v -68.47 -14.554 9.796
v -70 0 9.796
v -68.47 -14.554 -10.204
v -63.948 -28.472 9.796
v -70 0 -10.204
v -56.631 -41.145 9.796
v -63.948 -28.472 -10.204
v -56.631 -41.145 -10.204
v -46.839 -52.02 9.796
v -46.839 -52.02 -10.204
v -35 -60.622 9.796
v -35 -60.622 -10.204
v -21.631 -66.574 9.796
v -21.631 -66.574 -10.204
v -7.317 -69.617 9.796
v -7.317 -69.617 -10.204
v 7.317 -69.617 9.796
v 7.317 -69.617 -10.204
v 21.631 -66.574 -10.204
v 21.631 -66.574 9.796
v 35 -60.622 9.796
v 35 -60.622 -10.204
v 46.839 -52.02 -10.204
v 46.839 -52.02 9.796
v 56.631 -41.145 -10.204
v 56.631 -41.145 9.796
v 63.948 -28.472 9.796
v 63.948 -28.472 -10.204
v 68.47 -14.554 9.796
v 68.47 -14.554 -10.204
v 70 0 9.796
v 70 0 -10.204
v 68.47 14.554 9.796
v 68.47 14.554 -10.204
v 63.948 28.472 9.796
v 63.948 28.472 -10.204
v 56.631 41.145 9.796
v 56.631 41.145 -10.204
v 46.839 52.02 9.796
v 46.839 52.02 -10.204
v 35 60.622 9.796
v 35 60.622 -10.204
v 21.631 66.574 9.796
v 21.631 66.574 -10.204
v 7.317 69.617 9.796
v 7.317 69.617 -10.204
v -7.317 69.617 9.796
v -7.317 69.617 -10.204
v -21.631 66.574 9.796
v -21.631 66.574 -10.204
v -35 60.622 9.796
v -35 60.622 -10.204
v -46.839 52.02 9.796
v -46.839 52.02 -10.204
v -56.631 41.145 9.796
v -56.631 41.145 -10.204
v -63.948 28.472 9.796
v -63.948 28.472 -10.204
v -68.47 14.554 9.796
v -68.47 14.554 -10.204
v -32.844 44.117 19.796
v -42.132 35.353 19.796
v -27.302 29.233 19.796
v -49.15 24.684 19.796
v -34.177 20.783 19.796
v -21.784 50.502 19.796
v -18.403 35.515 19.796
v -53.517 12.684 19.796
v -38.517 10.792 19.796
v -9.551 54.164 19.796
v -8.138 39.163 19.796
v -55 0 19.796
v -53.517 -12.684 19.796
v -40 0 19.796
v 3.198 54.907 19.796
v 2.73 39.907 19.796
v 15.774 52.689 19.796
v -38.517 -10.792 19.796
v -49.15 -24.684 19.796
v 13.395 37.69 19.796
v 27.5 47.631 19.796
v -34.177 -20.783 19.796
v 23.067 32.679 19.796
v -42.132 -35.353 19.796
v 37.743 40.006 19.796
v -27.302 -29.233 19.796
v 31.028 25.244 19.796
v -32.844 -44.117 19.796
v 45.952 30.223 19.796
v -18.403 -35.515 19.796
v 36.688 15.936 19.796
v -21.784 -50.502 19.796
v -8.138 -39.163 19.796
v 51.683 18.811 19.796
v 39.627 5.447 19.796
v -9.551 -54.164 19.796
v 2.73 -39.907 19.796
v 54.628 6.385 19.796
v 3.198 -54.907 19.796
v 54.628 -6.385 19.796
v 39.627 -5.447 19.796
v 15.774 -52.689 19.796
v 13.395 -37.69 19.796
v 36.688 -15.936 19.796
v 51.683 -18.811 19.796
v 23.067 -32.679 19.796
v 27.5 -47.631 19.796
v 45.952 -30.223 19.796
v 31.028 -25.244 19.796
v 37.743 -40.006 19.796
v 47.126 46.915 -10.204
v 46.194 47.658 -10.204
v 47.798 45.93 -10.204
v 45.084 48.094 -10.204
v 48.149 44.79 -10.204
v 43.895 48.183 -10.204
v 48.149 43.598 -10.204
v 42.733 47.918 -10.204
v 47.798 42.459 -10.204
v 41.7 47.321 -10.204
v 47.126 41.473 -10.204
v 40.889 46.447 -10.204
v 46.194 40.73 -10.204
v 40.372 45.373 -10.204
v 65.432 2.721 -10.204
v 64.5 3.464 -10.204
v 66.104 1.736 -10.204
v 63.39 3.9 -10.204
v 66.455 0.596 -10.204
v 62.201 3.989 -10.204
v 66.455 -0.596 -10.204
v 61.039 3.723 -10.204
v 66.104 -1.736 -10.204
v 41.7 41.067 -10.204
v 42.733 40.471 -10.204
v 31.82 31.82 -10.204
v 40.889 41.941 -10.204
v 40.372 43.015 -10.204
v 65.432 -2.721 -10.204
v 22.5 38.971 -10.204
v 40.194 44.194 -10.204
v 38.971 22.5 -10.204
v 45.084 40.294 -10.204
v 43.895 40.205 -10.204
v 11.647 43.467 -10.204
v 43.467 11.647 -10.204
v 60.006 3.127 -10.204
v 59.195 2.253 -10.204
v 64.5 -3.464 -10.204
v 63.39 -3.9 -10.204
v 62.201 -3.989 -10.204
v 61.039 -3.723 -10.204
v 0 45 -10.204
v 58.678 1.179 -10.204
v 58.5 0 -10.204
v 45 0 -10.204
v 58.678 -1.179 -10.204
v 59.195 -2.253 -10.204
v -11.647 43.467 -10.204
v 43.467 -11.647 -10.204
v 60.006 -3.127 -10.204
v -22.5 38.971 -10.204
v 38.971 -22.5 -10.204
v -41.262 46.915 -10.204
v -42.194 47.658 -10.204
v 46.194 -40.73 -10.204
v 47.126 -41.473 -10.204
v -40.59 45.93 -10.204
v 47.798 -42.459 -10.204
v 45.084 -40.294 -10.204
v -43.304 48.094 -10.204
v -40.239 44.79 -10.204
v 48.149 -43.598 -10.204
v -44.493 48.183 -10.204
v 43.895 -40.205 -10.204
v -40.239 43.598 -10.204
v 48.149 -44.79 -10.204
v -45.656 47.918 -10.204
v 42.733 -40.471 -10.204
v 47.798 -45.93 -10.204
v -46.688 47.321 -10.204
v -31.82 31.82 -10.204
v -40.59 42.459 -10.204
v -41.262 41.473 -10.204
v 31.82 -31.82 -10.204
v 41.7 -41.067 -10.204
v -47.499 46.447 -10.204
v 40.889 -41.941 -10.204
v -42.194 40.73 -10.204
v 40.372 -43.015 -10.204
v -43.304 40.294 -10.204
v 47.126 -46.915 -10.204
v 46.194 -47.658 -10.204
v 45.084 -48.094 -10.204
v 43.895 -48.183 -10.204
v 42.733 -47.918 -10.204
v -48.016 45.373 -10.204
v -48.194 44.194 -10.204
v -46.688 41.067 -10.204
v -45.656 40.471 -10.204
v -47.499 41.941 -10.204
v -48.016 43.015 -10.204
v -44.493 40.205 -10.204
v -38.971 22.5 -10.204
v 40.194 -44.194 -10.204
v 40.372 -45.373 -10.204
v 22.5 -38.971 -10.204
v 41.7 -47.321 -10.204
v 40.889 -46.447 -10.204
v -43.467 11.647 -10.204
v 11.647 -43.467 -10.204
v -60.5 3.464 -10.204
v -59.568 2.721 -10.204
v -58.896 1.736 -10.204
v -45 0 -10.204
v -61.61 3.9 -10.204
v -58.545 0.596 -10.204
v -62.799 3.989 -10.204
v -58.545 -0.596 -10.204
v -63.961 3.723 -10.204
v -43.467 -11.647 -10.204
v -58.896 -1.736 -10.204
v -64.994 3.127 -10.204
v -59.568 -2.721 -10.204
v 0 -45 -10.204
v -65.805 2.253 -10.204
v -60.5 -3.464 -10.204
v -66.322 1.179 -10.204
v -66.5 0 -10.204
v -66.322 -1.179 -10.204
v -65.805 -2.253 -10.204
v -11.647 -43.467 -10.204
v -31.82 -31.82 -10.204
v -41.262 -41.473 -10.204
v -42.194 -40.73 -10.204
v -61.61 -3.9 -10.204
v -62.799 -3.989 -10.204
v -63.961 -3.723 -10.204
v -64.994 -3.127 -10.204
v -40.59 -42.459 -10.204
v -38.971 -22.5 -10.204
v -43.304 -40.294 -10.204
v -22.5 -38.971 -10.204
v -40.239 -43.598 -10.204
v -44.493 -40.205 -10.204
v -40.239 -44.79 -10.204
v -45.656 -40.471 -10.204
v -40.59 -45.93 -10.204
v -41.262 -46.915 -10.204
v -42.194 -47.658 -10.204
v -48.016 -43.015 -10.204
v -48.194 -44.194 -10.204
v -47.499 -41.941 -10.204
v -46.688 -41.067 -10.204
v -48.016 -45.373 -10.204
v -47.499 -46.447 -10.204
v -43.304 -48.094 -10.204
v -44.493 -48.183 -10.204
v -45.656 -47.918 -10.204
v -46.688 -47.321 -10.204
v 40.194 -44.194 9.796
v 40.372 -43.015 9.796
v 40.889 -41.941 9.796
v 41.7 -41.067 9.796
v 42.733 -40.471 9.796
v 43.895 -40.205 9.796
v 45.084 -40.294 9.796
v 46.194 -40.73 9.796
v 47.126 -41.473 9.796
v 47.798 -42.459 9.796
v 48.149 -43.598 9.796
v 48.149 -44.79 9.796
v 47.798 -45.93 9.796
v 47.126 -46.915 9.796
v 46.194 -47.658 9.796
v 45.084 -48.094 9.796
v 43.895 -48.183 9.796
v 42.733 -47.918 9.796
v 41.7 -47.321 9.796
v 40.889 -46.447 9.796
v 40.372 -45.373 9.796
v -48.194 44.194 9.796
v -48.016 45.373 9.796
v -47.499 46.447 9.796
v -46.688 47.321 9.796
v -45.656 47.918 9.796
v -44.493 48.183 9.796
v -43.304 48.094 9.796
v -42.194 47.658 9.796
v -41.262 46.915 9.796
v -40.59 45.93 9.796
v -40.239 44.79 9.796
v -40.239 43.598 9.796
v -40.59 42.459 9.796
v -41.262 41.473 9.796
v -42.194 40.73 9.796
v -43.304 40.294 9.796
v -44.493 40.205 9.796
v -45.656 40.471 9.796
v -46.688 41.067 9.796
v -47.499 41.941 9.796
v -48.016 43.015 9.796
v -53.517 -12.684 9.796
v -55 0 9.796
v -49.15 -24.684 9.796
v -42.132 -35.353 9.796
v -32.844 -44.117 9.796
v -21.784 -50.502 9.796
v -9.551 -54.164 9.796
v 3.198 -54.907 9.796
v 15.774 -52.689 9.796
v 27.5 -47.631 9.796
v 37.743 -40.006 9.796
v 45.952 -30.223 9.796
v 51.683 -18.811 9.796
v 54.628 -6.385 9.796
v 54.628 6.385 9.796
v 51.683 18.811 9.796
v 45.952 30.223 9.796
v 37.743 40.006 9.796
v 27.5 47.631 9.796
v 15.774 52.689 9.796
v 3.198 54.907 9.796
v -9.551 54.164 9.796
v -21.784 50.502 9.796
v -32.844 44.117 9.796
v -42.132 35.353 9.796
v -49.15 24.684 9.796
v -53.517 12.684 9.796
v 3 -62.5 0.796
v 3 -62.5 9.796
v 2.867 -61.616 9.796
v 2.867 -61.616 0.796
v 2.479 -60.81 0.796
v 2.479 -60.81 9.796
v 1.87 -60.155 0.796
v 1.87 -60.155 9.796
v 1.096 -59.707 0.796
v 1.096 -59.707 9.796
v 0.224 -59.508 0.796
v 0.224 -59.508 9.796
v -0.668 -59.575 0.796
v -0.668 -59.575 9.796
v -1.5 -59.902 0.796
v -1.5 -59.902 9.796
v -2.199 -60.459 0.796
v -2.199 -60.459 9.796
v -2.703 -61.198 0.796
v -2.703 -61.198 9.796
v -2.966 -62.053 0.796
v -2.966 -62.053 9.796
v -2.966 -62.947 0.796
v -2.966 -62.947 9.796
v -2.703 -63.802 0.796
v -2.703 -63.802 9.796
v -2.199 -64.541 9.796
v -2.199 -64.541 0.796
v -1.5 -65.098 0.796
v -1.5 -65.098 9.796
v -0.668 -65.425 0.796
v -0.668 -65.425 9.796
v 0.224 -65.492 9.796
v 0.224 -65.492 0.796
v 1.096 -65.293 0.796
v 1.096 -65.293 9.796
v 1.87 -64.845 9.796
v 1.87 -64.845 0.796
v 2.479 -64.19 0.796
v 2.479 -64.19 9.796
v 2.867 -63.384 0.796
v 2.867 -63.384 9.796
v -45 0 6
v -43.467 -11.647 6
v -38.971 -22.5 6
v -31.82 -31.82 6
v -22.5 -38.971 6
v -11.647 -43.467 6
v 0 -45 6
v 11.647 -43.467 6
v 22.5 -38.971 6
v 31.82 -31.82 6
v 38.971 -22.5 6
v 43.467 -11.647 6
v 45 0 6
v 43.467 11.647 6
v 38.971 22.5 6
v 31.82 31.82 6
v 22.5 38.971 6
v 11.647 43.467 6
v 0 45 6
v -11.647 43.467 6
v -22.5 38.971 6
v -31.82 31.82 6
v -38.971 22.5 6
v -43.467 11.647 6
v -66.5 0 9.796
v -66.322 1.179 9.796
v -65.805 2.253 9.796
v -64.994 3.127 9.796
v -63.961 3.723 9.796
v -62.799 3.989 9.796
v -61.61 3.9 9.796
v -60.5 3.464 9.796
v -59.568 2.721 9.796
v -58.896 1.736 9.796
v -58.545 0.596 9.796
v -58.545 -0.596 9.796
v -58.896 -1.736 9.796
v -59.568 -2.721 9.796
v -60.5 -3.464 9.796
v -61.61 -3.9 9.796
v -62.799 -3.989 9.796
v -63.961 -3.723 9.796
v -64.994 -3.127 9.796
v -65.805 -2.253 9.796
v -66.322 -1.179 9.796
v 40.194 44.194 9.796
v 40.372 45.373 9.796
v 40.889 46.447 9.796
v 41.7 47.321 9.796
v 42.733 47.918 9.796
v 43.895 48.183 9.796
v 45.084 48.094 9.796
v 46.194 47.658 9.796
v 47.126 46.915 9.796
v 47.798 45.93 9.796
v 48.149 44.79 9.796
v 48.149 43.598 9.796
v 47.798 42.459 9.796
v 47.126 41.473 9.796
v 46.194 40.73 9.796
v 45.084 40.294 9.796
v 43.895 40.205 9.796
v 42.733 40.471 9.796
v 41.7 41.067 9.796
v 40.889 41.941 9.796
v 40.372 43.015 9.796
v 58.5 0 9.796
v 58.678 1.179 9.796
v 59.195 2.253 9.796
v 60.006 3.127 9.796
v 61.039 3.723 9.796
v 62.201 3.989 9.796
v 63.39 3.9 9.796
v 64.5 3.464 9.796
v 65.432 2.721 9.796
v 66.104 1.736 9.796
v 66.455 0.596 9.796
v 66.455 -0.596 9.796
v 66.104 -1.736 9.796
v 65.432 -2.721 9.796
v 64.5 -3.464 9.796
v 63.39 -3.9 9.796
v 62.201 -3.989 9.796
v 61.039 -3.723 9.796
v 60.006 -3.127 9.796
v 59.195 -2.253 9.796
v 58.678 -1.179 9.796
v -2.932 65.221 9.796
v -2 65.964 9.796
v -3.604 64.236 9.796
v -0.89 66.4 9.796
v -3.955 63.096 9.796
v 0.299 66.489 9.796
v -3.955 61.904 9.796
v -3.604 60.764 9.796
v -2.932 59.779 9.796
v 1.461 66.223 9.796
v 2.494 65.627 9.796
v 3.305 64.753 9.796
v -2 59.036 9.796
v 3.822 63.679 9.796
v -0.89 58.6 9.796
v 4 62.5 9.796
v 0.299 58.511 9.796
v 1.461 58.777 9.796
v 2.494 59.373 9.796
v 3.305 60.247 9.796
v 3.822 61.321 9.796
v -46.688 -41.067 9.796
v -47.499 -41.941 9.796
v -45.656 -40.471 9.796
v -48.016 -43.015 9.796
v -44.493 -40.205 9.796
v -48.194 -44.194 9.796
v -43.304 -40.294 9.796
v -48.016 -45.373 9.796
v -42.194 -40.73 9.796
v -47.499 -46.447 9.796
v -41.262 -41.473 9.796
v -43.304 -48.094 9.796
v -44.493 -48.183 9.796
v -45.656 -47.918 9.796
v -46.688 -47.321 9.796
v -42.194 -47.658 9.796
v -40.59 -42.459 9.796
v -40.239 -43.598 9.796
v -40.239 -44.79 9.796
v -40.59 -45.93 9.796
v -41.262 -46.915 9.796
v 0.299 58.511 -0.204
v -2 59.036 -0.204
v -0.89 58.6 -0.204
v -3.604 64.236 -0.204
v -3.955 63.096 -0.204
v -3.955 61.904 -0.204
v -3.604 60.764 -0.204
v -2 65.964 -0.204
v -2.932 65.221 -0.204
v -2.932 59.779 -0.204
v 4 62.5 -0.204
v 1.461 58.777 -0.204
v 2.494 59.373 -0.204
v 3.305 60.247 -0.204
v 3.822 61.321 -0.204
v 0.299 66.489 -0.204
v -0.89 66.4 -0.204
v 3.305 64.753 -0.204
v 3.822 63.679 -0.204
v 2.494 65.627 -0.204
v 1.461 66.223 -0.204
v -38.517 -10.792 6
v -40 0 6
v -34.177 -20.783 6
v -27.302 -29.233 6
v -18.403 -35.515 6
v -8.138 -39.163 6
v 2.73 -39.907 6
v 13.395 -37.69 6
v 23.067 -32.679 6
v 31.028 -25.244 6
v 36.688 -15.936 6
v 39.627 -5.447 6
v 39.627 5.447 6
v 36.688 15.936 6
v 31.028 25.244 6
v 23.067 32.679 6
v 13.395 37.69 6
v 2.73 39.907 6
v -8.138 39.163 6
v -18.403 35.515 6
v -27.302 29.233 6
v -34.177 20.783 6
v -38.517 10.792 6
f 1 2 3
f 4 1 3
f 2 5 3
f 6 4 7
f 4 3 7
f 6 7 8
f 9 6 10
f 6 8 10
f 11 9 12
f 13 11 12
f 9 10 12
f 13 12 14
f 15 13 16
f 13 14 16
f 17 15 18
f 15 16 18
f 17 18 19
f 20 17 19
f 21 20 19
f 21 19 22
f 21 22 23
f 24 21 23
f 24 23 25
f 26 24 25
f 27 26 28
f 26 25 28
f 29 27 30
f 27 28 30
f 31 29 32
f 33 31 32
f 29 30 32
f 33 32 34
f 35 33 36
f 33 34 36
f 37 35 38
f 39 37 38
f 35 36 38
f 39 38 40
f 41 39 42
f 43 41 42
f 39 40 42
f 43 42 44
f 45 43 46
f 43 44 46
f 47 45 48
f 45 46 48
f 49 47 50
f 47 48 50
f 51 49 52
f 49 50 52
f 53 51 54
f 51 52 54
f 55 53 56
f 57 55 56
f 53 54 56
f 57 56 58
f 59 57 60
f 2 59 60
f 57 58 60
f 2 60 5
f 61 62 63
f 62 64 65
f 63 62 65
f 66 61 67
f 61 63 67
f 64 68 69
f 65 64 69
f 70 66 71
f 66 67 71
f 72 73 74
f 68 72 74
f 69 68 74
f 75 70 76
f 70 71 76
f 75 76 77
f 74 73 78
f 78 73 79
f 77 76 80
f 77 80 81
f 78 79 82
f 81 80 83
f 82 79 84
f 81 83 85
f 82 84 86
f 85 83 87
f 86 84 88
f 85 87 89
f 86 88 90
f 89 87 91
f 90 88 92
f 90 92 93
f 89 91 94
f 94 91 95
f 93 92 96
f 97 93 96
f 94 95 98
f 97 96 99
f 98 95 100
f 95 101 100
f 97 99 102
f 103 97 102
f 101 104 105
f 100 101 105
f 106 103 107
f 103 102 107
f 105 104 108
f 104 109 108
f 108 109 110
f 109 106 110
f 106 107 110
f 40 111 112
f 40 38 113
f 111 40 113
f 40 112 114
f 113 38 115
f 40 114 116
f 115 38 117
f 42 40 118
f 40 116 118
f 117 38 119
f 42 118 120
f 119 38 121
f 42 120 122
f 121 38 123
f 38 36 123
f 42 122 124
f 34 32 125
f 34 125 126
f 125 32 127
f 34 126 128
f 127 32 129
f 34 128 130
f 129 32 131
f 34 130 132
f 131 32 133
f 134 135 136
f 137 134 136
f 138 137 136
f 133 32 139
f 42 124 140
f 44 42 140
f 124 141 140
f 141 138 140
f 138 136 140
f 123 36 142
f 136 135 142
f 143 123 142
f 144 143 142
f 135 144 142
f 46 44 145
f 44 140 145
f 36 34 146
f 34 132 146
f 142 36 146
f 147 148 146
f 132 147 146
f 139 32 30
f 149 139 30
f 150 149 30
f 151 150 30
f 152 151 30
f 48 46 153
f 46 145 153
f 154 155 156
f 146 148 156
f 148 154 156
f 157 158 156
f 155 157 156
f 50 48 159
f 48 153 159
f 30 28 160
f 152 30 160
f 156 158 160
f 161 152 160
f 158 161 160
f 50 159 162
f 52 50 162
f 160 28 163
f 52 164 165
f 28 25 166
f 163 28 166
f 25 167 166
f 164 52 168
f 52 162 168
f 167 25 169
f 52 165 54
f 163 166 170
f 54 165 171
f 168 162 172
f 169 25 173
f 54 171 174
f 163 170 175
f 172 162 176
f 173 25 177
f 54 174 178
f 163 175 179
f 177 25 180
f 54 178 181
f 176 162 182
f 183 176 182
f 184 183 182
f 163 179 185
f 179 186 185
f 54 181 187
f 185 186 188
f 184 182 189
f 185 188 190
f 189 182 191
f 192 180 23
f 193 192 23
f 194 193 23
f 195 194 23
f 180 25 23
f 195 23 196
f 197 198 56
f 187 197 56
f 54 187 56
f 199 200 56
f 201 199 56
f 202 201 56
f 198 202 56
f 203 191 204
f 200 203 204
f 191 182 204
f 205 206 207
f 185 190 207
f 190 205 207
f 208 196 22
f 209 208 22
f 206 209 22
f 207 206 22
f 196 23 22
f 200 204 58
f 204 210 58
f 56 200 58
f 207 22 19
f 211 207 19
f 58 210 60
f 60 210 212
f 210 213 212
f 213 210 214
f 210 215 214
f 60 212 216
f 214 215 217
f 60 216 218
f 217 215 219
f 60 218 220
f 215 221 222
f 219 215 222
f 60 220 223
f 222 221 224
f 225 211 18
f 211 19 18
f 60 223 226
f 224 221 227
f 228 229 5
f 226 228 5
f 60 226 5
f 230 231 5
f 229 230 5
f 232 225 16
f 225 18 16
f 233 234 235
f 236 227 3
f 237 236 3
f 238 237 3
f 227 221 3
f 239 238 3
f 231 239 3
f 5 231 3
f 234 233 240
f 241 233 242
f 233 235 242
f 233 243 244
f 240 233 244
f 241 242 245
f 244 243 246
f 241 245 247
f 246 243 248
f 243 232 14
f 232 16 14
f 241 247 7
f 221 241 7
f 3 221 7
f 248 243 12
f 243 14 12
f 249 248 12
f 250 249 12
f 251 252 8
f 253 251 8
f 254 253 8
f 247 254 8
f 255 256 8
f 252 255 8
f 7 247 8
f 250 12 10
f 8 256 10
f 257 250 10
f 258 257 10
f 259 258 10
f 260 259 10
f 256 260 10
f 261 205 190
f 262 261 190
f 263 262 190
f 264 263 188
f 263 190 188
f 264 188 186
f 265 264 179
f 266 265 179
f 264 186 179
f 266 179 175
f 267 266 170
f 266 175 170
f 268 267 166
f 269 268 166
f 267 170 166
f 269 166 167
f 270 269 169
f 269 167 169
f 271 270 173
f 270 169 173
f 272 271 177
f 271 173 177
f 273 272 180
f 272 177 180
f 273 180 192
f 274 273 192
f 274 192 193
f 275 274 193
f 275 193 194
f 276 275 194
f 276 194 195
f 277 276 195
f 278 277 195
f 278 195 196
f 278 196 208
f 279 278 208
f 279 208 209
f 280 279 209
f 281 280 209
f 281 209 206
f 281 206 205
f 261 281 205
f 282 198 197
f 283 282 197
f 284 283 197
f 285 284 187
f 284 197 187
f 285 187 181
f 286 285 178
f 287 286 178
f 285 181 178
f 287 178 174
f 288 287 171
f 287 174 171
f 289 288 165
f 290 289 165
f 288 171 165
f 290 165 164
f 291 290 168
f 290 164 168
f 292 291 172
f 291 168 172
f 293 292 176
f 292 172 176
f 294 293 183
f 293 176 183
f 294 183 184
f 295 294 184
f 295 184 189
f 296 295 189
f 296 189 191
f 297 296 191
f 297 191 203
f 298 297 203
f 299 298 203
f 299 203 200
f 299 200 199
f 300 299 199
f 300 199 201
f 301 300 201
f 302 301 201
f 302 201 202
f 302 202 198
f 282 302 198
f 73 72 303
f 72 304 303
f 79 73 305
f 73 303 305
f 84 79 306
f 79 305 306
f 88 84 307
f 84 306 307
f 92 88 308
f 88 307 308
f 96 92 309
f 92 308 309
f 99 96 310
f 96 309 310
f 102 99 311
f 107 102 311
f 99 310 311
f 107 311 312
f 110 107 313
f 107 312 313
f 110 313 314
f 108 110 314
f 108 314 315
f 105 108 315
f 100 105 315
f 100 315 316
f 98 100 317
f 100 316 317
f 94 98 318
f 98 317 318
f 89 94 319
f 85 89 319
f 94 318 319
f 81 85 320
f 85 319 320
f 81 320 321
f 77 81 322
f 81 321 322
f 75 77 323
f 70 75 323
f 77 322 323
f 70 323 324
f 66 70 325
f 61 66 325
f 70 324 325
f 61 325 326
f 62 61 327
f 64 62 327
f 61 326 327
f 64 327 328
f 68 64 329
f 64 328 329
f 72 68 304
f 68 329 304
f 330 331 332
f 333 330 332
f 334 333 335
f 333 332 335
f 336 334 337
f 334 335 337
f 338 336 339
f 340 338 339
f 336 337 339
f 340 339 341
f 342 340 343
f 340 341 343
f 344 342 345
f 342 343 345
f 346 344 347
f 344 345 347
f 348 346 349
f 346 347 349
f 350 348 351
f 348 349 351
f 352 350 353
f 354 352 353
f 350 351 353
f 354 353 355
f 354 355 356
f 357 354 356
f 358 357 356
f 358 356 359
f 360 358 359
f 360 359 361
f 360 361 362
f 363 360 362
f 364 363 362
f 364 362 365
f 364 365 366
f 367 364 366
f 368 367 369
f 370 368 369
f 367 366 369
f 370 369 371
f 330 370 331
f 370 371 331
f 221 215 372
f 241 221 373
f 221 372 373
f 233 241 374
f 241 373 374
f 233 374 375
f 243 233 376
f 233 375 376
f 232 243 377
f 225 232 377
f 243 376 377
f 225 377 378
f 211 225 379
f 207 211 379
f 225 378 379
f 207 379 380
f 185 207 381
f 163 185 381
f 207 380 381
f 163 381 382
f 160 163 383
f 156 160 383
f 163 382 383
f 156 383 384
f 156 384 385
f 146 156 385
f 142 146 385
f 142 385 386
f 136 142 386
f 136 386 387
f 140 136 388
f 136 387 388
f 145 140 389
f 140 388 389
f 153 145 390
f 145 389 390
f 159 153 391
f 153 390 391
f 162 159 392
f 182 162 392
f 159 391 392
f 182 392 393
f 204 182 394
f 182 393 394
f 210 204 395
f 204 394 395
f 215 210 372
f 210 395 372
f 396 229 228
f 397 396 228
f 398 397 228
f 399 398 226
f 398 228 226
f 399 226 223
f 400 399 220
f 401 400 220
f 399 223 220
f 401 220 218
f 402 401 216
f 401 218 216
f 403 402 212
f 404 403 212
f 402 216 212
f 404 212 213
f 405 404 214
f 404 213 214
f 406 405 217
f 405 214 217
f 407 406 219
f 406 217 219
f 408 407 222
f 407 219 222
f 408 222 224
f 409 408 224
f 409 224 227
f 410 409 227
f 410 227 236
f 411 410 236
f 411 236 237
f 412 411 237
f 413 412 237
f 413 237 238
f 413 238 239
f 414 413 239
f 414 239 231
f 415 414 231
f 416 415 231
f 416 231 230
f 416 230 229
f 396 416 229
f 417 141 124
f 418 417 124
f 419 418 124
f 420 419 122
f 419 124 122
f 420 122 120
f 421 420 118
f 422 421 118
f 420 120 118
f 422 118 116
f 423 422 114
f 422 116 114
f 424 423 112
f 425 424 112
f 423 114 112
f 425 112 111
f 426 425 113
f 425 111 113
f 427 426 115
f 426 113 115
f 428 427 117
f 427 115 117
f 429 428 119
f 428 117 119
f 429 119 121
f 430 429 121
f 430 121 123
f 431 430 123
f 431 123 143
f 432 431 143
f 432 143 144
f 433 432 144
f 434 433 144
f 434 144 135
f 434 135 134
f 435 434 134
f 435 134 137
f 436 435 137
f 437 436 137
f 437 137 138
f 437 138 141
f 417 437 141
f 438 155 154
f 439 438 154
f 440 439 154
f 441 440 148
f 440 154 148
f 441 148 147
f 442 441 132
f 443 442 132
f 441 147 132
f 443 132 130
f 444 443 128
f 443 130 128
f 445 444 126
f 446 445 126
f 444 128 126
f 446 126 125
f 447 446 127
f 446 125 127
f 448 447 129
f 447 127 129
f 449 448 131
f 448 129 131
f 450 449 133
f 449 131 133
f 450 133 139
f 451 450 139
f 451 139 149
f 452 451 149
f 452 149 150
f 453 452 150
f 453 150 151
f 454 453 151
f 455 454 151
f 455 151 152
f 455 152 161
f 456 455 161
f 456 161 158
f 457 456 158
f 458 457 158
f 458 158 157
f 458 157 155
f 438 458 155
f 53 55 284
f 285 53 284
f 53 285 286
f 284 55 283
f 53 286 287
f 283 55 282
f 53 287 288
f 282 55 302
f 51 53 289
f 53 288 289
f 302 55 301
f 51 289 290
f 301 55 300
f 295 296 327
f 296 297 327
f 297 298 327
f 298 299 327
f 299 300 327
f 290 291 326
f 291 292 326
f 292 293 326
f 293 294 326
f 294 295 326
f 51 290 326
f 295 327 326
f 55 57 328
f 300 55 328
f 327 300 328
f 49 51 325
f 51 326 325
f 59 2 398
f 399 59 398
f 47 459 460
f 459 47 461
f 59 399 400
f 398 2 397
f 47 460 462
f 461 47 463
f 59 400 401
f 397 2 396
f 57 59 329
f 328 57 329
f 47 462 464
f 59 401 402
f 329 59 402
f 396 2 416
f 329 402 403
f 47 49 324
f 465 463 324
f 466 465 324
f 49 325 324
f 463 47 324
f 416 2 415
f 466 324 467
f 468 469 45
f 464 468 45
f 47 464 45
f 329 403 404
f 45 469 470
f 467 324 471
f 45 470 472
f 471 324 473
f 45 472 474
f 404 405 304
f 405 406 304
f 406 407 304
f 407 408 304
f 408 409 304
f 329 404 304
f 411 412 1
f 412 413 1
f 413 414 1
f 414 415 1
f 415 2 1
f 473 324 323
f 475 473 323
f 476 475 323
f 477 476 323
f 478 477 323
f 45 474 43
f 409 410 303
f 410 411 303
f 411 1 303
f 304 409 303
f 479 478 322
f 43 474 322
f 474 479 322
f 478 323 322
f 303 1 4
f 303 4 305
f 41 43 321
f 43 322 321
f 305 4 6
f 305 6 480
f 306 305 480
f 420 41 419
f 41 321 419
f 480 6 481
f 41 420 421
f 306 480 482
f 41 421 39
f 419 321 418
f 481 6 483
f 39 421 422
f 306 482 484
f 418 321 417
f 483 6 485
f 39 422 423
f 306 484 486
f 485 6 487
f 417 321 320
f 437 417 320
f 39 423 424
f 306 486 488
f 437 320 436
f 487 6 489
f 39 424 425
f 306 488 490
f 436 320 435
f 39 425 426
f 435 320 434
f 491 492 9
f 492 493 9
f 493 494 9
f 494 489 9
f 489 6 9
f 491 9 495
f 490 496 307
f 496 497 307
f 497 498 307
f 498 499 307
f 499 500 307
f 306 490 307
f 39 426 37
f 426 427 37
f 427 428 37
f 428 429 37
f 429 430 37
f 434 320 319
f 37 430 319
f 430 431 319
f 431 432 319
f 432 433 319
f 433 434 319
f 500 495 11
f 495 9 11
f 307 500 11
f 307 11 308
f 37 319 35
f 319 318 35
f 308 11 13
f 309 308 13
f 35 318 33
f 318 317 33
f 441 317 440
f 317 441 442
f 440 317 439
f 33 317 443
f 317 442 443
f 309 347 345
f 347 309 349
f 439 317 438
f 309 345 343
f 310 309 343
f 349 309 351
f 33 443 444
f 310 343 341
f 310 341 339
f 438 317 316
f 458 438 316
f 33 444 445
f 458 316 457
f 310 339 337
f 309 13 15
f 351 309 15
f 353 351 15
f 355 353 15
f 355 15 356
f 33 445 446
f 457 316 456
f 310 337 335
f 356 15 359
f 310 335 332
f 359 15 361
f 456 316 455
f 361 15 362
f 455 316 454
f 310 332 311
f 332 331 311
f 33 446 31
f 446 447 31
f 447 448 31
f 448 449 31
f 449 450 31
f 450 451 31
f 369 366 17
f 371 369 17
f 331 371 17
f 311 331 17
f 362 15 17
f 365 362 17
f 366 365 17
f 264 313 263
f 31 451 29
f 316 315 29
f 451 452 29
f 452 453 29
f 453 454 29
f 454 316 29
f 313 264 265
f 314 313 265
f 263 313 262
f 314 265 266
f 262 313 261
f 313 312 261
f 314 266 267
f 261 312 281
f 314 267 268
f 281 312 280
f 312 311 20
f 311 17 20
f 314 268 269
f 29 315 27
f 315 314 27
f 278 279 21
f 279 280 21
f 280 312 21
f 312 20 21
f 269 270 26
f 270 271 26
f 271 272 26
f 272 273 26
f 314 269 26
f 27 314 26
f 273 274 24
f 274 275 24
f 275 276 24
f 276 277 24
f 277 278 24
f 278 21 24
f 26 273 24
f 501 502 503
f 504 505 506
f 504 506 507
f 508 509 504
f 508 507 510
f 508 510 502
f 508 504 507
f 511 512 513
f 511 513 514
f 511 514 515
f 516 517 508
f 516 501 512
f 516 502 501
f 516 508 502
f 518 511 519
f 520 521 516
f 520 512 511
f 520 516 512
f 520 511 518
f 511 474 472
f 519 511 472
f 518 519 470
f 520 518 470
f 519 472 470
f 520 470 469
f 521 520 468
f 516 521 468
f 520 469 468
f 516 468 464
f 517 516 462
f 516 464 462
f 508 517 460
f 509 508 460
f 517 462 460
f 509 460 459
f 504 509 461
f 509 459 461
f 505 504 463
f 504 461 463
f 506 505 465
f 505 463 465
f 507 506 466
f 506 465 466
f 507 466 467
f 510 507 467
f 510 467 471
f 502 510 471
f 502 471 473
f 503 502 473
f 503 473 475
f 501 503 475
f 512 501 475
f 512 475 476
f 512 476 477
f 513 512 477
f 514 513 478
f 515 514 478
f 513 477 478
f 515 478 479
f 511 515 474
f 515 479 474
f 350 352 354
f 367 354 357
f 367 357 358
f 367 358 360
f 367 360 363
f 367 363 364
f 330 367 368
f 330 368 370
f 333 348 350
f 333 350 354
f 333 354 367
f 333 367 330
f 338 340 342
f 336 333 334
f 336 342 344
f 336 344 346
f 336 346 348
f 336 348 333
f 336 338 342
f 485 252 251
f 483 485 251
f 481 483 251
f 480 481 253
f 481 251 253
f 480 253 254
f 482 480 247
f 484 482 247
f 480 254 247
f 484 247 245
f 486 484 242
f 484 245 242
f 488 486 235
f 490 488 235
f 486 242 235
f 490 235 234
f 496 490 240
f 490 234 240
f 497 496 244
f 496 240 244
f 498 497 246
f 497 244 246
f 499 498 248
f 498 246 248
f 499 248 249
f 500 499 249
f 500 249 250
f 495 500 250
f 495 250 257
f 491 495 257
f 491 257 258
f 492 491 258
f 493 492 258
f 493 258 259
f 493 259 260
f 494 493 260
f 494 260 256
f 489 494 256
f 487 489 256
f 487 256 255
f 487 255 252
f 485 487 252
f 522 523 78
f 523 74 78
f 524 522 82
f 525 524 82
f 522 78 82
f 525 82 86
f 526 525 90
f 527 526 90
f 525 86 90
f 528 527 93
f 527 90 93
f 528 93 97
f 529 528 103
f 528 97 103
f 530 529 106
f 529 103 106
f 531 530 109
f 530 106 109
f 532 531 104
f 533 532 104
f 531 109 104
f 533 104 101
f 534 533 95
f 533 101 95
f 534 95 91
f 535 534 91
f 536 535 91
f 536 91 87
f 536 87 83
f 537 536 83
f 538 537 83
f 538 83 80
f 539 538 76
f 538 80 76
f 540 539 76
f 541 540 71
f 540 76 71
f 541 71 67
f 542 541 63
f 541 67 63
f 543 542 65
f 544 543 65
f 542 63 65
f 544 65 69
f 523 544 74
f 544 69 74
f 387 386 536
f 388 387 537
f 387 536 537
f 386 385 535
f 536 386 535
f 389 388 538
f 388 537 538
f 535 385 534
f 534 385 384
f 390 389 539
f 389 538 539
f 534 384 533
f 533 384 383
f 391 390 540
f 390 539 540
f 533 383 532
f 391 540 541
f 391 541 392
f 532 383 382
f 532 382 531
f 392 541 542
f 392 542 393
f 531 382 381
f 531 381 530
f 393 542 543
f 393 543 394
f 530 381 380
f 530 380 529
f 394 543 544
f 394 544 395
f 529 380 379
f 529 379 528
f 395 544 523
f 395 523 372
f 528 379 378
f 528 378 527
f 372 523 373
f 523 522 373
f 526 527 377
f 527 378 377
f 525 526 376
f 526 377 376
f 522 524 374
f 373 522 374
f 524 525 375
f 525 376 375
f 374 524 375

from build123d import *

# Parameters (mm, degrees)
SKETCH2_R             = 3
CUT_EXTRUDE1_DEPTH    = 9
SKETCH3_R             = 4
CUT_EXTRUDE2_DEPTH    = 10
F_8_0MM_DOWEL_HOLE1_D = 8


with BuildPart() as part:
    # Sketch1 → Revolve1 (revolve)
    with BuildSketch(Plane(origin=(0, 0, 0), x_dir=(1, 0, 0), z_dir=(0, 1, 0))):
        Polygon((-55, -19.79575879), (-55, -9.79575879), (-70, -9.79575879), (-70, 10.20424121), (-45, 10.20424121), (-45, -6), (-40, -6), (-40, -19.79575879), align=None)
    revolve(axis=Axis((0, 0, -52.707374268), (0, 0, 1)))

    # Sketch2 → Cut-Extrude1 (cut)
    with BuildSketch(Plane.XY.offset(9.79575879)):
        with Locations((0, -62.5)):
            Circle(SKETCH2_R)
    extrude(amount=-CUT_EXTRUDE1_DEPTH, mode=Mode.SUBTRACT)

    # Sketch3 → Cut-Extrude2 (cut)
    with BuildSketch(Plane.XY.offset(9.79575879)):
        with Locations((0, 62.5)):
            Circle(SKETCH3_R)
    extrude(amount=-CUT_EXTRUDE2_DEPTH, mode=Mode.SUBTRACT)

    # Ø8.0mm Dowel Hole1 (through all)
    with Locations(Plane.XY.offset(9.79575879)):
        with Locations((44.194173824, 44.194173824), (62.5, 0), (44.194173824, -44.194173824), (-44.194173824, -44.194173824), (-62.5, 0), (-44.194173824, 44.194173824)):
            Hole(F_8_0MM_DOWEL_HOLE1_D / 2)


solid = part.part
